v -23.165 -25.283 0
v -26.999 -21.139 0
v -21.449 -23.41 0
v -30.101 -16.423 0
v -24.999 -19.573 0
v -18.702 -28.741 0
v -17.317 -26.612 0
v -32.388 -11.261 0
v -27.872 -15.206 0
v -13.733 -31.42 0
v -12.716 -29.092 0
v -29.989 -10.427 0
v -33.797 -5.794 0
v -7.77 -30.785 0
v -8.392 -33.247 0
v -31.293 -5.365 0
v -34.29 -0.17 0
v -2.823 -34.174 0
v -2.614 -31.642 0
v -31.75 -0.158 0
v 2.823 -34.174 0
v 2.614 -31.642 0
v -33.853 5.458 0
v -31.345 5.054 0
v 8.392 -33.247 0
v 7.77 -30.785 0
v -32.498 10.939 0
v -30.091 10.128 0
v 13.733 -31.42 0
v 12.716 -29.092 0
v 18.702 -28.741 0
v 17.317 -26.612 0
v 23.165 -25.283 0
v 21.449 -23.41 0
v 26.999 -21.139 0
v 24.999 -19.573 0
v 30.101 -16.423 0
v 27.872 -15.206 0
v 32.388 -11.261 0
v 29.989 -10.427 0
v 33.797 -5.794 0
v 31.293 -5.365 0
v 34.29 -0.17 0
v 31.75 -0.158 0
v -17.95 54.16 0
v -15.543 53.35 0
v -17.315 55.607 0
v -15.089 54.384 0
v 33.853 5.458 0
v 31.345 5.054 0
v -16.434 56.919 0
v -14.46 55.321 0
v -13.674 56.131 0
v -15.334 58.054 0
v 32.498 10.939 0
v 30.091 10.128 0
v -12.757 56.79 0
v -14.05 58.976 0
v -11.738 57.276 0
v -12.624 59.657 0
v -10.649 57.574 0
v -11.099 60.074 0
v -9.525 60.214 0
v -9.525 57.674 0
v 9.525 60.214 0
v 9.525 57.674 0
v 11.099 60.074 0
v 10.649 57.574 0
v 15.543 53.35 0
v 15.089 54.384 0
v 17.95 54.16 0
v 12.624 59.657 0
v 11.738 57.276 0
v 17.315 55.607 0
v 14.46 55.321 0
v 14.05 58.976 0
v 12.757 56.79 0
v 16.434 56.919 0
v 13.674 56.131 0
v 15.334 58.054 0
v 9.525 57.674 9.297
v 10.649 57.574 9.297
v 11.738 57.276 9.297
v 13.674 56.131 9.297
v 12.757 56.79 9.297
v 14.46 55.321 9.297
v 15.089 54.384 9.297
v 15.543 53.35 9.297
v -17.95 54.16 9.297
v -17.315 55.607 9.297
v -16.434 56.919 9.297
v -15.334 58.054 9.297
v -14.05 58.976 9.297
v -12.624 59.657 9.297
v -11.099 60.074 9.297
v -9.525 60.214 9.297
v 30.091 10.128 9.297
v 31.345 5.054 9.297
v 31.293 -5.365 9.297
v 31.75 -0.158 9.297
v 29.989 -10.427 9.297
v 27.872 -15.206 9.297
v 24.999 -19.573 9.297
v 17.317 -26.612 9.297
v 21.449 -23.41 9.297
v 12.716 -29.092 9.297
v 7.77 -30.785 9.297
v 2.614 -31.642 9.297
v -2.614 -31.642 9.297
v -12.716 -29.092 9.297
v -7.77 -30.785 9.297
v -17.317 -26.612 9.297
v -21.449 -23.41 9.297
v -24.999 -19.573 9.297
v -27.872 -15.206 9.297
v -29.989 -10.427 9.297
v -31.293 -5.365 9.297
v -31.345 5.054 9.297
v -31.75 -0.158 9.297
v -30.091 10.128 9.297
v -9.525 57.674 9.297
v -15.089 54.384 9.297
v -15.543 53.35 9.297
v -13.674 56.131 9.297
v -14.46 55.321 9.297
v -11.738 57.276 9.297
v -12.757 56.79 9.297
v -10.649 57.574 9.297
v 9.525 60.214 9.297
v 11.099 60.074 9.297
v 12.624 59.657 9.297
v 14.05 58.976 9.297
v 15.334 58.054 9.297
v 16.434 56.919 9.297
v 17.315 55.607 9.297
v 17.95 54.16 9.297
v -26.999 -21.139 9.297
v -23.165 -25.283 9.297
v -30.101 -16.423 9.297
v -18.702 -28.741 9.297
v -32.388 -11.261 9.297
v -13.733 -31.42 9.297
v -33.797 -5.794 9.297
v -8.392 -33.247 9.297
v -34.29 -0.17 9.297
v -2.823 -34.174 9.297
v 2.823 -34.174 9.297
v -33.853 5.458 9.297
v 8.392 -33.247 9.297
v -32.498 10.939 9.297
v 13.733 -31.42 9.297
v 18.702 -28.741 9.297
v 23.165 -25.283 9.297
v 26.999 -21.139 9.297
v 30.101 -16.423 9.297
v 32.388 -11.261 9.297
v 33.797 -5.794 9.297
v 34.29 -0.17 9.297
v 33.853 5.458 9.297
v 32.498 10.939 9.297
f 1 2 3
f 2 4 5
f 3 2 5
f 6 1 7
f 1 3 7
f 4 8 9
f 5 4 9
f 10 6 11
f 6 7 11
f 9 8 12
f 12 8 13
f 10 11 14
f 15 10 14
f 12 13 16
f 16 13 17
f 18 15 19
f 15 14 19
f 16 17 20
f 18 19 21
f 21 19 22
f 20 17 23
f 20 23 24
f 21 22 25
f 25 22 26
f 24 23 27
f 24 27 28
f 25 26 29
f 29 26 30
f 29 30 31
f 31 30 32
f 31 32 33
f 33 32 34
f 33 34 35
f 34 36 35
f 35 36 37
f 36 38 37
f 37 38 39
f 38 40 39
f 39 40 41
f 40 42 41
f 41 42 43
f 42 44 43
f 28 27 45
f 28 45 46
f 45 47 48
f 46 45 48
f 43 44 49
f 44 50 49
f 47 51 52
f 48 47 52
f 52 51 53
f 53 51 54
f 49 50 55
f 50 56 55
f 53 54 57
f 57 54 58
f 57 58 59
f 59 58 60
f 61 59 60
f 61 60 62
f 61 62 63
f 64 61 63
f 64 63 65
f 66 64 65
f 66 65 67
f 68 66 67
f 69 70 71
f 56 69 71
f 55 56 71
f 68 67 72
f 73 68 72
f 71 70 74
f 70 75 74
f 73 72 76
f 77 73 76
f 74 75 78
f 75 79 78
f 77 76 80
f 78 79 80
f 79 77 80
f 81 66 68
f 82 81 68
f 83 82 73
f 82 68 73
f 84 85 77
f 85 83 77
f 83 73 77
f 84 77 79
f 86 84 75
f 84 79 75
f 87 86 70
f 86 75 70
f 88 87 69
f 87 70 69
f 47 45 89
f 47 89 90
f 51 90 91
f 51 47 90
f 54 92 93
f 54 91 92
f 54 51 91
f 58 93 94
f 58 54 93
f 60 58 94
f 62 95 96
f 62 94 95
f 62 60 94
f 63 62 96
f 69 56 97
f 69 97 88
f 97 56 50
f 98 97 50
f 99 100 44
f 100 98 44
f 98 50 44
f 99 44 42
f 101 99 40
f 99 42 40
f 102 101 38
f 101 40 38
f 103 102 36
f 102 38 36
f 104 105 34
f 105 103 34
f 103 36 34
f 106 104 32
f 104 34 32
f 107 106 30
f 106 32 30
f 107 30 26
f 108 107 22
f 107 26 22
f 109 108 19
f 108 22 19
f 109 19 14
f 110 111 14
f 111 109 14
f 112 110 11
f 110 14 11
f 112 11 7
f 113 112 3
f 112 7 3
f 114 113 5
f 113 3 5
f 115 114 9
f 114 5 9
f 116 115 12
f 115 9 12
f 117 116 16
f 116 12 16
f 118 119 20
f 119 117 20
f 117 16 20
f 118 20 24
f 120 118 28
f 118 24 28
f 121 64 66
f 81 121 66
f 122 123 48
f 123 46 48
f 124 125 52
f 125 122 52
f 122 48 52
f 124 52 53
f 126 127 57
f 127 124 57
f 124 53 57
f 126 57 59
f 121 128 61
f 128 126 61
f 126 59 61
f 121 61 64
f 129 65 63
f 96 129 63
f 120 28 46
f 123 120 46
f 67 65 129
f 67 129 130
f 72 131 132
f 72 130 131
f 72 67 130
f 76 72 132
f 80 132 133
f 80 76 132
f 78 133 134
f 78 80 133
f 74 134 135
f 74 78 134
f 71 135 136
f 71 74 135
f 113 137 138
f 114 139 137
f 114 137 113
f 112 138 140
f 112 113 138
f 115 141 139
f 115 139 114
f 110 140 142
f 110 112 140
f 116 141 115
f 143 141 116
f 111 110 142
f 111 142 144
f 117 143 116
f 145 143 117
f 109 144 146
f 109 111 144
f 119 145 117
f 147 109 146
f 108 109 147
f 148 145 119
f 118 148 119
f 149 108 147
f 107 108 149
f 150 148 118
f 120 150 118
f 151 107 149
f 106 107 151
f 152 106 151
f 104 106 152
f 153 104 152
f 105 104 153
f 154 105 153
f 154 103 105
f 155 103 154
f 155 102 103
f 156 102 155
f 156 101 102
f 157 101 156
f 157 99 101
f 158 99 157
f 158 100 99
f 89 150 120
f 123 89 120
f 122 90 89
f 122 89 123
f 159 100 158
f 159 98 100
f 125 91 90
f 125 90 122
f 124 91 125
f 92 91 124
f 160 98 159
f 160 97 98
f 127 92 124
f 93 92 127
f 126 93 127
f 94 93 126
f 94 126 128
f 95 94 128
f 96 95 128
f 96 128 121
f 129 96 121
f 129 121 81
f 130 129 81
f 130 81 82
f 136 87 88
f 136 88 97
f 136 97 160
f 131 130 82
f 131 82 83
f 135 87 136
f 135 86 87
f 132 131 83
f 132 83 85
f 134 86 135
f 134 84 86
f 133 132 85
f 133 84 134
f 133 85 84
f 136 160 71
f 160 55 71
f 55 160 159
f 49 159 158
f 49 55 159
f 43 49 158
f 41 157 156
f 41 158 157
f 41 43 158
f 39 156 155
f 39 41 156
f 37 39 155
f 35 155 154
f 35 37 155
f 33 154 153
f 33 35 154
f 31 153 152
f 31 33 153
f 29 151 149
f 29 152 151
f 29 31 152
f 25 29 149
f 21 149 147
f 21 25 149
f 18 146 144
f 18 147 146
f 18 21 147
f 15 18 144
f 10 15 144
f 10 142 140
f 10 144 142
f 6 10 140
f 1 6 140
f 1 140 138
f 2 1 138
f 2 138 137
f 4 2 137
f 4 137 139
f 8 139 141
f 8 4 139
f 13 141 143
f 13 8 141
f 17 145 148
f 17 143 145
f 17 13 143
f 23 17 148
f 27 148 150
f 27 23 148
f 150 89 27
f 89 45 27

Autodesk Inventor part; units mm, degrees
ref_plane "YZ Plane" through (0, 0, 0) normal (1, 0, 0) x (0, 1, 0)
ref_plane "XZ Plane" through (0, 0, 0) normal (0, 1, 0) x (-1, 0, 0)
ref_plane "XY Plane" through (0, 0, 0) normal (0, 0, 1) x (1, 0, 0)
sketch "Sketch1" plane through (0, 0, 0) normal (0, 0, 1) x (1, 0, 0)
  line L0 (-15.875, 29.0994) -> (-12.7, 29.0994) construction
  line L1 (-15.875, 51.3244) -> (-15.875, 29.0994) construction
  arc A0 (-9.525, 57.6744) -> (-15.875, 51.3244) centre (-9.525, 51.3244) ccw construction
  line L2 (9.525, 57.6744) -> (-9.525, 57.6744) construction
  arc A1 (15.875, 51.3244) -> (9.525, 57.6744) centre (9.525, 51.3244) ccw construction
  line L3 (15.875, 29.0994) -> (15.875, 51.3244) construction
  line L4 (12.7, 29.0994) -> (15.875, 29.0994) construction
  line L5 (12.7, 51.3244) -> (12.7, 29.0994) construction
  arc A2 (12.7, 51.3244) -> (9.525, 54.4994) centre (9.525, 51.3244) ccw construction
  line L6 (-9.525, 54.4994) -> (9.525, 54.4994) construction
  arc A3 (-9.525, 54.4994) -> (-12.7, 51.3244) centre (-9.525, 51.3244) ccw construction
  line L7 (-12.7, 29.0994) -> (-12.7, 51.3244) construction
  line L8 (-30.0912, 10.1284) -> (-15.5432, 53.35)
  line L9 (30.0912, 10.1284) -> (15.5432, 53.35)
  arc A4 (-9.525, 57.6744) -> (-15.5432, 53.35) centre (-9.525, 51.3244) ccw
  arc A5 (15.5432, 53.35) -> (9.525, 57.6744) centre (9.525, 51.3244) ccw
  line L10 (-9.525, 57.6744) -> (9.525, 57.6744)
  arc A6 (-30.0912, 10.1284) -> (30.0912, 10.1284) centre (0, 0) ccw
  line L11 (-17.9505, 54.1603) -> (-32.4985, 10.9386)
  arc A7 (-32.4985, 10.9386) -> (32.4985, 10.9386) centre (0, 0) ccw
  line L12 (32.4985, 10.9386) -> (17.9505, 54.1603)
  arc A8 (17.9505, 54.1603) -> (9.525, 60.2144) centre (9.525, 51.3244) ccw
  line L13 (9.525, 60.2144) -> (-9.525, 60.2144)
  arc A9 (-9.525, 60.2144) -> (-17.9505, 54.1603) centre (-9.525, 51.3244) ccw
  circle A10 centre (0, 0) radius 31.75 construction
  dimension "d0" = 2.54
extrude "Extrusion1" add sketch "Sketch1" along normal blind 9.297
properties part number "Weight Shifter Tension Strap 2" material "Rubber"
